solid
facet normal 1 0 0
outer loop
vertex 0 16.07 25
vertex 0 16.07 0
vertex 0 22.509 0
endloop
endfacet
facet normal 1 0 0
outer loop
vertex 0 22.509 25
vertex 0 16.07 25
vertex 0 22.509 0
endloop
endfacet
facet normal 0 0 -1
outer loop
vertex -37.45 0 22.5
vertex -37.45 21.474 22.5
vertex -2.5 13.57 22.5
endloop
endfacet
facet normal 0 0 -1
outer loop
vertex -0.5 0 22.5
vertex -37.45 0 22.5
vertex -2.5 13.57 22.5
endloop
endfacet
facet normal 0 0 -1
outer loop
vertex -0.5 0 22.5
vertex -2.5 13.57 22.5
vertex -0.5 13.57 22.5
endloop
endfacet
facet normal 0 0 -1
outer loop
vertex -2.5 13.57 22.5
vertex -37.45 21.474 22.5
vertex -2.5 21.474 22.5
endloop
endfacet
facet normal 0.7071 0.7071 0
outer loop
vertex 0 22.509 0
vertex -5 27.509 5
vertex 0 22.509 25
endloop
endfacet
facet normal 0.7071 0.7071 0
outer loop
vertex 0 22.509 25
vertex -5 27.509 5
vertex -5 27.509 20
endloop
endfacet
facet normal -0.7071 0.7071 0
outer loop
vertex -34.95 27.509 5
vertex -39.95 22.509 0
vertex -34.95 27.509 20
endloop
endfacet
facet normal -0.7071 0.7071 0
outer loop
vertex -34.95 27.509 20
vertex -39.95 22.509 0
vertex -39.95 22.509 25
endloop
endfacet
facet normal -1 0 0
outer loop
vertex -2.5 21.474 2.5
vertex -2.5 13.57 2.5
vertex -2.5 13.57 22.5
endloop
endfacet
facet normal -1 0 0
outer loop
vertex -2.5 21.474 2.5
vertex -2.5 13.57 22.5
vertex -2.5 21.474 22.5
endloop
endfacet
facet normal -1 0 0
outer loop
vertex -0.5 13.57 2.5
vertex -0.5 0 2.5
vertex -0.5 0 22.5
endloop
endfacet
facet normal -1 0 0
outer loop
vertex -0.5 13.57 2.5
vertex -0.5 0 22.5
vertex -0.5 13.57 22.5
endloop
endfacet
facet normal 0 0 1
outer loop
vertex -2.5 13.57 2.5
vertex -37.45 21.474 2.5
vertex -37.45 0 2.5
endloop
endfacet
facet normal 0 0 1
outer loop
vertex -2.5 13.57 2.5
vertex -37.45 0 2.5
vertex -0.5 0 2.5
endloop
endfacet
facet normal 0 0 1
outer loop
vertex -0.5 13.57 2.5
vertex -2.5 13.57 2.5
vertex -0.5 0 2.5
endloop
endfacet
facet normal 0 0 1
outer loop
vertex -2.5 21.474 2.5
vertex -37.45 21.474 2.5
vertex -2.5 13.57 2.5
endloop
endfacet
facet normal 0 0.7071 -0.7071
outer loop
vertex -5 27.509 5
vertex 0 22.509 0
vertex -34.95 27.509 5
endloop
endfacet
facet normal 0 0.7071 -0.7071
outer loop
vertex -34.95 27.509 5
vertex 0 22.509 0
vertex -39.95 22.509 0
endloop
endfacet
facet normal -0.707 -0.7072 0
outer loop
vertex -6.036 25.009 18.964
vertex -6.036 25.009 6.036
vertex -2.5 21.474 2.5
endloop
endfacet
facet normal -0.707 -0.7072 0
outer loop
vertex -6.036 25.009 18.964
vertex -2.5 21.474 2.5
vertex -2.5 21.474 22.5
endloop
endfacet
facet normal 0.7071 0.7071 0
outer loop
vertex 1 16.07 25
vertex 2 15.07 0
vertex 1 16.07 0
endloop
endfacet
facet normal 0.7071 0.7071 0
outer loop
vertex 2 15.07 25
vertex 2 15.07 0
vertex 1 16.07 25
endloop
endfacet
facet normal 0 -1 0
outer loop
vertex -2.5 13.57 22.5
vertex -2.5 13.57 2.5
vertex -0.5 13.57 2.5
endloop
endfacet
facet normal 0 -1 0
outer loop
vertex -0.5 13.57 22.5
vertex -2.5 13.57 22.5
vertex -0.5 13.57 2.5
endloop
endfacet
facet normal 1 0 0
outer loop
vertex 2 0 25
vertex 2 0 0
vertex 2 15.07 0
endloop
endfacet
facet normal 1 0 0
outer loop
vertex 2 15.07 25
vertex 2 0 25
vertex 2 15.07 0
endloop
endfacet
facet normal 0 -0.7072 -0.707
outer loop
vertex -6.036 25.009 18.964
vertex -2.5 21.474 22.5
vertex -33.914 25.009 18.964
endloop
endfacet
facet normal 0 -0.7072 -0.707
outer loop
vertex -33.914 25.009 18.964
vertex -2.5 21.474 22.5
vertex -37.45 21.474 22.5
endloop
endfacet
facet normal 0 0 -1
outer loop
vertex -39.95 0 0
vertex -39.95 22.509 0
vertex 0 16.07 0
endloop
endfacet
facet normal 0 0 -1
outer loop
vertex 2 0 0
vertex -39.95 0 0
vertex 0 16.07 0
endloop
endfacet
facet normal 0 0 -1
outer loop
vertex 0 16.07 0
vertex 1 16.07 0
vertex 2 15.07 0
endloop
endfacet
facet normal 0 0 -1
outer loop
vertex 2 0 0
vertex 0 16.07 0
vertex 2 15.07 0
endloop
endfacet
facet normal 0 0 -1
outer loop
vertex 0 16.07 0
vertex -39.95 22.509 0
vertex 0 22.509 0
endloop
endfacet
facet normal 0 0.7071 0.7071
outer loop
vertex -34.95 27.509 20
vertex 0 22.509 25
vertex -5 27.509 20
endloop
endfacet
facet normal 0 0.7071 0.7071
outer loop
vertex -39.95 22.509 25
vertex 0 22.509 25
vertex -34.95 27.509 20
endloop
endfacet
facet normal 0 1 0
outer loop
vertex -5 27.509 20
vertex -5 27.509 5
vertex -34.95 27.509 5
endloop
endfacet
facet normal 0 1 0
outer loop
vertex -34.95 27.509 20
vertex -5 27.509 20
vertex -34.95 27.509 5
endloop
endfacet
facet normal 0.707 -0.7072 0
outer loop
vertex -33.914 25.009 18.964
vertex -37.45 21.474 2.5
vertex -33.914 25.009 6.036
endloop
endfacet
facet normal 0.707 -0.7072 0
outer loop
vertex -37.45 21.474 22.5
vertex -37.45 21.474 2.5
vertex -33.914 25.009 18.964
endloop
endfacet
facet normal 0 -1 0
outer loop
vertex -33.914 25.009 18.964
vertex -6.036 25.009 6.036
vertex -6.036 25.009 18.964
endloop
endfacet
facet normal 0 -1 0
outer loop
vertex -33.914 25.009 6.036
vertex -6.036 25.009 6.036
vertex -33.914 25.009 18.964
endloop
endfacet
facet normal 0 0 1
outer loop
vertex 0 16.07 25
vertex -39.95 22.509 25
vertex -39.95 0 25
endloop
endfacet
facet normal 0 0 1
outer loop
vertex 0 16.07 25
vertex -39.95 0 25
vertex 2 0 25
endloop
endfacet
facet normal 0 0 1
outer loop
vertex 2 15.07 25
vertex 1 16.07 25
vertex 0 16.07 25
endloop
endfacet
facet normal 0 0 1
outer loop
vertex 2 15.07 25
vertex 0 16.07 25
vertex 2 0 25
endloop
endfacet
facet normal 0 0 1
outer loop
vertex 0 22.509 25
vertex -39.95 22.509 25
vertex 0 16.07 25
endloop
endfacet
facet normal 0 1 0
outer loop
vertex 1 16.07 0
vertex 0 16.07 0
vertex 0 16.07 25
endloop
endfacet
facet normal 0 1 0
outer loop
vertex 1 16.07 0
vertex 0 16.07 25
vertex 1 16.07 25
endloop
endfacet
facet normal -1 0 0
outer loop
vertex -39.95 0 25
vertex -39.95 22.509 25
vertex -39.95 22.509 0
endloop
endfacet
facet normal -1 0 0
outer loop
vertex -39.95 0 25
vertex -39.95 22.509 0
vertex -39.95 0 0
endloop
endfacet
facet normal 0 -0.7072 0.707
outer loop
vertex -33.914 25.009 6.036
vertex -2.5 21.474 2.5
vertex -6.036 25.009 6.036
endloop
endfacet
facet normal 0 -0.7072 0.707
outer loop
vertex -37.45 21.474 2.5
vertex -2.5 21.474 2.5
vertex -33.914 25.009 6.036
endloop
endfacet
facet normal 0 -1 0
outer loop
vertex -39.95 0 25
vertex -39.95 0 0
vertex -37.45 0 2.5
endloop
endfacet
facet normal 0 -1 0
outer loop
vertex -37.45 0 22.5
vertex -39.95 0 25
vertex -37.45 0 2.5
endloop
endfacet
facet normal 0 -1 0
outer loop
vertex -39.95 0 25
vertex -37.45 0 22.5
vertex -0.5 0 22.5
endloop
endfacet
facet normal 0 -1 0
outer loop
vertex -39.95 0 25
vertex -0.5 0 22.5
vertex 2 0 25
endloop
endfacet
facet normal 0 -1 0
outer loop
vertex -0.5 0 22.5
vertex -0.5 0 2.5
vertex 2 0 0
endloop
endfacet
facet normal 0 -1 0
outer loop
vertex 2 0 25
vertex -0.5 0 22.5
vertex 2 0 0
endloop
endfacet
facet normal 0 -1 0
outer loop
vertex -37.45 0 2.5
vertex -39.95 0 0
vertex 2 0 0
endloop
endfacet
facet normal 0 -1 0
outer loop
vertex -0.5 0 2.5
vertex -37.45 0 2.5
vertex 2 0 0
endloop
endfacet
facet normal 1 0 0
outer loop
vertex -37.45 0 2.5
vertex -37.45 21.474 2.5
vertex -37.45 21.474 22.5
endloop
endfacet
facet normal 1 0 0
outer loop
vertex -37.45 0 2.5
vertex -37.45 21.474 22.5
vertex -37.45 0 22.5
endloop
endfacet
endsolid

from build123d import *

# Parameters (mm, degrees)
F0_W     = 2
F0_H     = 16.0696078092
F1_DEPTH = 25
F2_SIZE  = 5
F3_SIZE  = 1
F4_T     = -2.5


with BuildPart() as f1:
    # F0 (on Top) → F1 (new body)
    with BuildSketch(Plane.XY):
        with Locations((1, 8.0348039046)):
            Rectangle(F0_W, F0_H)
        Polygon((-17.9578904063, 0), (0, 0), (0, 16.0696078092), (0, 27.5092944503), (-39.9500094354, 27.5092944503), (-39.9500094354, 0), align=None)
    extrude(amount=F1_DEPTH)

    # F2
    f2_edges = [f1.edges().sort_by_distance(p)[0] for p in [
        (0, 27.509294, 12.5),
        (-39.950009, 27.509294, 12.5),
        (-19.975005, 27.509294, 0),
        (-19.975005, 27.509294, 25),
    ]]
    chamfer(f2_edges, length=F2_SIZE)

    # F3
    f3_edges = [f1.edges().sort_by_distance(p)[0] for p in [
        (2, 16.069608, 12.5),
    ]]
    chamfer(f3_edges, length=F3_SIZE)

    # F4
    f4_openings = [f1.faces().sort_by_distance(p)[0] for p in [
        (-18.975005, 0, 12.5),
    ]]
    offset(amount=F4_T, openings=f4_openings, kind=Kind.INTERSECTION)


solid = f1.part
